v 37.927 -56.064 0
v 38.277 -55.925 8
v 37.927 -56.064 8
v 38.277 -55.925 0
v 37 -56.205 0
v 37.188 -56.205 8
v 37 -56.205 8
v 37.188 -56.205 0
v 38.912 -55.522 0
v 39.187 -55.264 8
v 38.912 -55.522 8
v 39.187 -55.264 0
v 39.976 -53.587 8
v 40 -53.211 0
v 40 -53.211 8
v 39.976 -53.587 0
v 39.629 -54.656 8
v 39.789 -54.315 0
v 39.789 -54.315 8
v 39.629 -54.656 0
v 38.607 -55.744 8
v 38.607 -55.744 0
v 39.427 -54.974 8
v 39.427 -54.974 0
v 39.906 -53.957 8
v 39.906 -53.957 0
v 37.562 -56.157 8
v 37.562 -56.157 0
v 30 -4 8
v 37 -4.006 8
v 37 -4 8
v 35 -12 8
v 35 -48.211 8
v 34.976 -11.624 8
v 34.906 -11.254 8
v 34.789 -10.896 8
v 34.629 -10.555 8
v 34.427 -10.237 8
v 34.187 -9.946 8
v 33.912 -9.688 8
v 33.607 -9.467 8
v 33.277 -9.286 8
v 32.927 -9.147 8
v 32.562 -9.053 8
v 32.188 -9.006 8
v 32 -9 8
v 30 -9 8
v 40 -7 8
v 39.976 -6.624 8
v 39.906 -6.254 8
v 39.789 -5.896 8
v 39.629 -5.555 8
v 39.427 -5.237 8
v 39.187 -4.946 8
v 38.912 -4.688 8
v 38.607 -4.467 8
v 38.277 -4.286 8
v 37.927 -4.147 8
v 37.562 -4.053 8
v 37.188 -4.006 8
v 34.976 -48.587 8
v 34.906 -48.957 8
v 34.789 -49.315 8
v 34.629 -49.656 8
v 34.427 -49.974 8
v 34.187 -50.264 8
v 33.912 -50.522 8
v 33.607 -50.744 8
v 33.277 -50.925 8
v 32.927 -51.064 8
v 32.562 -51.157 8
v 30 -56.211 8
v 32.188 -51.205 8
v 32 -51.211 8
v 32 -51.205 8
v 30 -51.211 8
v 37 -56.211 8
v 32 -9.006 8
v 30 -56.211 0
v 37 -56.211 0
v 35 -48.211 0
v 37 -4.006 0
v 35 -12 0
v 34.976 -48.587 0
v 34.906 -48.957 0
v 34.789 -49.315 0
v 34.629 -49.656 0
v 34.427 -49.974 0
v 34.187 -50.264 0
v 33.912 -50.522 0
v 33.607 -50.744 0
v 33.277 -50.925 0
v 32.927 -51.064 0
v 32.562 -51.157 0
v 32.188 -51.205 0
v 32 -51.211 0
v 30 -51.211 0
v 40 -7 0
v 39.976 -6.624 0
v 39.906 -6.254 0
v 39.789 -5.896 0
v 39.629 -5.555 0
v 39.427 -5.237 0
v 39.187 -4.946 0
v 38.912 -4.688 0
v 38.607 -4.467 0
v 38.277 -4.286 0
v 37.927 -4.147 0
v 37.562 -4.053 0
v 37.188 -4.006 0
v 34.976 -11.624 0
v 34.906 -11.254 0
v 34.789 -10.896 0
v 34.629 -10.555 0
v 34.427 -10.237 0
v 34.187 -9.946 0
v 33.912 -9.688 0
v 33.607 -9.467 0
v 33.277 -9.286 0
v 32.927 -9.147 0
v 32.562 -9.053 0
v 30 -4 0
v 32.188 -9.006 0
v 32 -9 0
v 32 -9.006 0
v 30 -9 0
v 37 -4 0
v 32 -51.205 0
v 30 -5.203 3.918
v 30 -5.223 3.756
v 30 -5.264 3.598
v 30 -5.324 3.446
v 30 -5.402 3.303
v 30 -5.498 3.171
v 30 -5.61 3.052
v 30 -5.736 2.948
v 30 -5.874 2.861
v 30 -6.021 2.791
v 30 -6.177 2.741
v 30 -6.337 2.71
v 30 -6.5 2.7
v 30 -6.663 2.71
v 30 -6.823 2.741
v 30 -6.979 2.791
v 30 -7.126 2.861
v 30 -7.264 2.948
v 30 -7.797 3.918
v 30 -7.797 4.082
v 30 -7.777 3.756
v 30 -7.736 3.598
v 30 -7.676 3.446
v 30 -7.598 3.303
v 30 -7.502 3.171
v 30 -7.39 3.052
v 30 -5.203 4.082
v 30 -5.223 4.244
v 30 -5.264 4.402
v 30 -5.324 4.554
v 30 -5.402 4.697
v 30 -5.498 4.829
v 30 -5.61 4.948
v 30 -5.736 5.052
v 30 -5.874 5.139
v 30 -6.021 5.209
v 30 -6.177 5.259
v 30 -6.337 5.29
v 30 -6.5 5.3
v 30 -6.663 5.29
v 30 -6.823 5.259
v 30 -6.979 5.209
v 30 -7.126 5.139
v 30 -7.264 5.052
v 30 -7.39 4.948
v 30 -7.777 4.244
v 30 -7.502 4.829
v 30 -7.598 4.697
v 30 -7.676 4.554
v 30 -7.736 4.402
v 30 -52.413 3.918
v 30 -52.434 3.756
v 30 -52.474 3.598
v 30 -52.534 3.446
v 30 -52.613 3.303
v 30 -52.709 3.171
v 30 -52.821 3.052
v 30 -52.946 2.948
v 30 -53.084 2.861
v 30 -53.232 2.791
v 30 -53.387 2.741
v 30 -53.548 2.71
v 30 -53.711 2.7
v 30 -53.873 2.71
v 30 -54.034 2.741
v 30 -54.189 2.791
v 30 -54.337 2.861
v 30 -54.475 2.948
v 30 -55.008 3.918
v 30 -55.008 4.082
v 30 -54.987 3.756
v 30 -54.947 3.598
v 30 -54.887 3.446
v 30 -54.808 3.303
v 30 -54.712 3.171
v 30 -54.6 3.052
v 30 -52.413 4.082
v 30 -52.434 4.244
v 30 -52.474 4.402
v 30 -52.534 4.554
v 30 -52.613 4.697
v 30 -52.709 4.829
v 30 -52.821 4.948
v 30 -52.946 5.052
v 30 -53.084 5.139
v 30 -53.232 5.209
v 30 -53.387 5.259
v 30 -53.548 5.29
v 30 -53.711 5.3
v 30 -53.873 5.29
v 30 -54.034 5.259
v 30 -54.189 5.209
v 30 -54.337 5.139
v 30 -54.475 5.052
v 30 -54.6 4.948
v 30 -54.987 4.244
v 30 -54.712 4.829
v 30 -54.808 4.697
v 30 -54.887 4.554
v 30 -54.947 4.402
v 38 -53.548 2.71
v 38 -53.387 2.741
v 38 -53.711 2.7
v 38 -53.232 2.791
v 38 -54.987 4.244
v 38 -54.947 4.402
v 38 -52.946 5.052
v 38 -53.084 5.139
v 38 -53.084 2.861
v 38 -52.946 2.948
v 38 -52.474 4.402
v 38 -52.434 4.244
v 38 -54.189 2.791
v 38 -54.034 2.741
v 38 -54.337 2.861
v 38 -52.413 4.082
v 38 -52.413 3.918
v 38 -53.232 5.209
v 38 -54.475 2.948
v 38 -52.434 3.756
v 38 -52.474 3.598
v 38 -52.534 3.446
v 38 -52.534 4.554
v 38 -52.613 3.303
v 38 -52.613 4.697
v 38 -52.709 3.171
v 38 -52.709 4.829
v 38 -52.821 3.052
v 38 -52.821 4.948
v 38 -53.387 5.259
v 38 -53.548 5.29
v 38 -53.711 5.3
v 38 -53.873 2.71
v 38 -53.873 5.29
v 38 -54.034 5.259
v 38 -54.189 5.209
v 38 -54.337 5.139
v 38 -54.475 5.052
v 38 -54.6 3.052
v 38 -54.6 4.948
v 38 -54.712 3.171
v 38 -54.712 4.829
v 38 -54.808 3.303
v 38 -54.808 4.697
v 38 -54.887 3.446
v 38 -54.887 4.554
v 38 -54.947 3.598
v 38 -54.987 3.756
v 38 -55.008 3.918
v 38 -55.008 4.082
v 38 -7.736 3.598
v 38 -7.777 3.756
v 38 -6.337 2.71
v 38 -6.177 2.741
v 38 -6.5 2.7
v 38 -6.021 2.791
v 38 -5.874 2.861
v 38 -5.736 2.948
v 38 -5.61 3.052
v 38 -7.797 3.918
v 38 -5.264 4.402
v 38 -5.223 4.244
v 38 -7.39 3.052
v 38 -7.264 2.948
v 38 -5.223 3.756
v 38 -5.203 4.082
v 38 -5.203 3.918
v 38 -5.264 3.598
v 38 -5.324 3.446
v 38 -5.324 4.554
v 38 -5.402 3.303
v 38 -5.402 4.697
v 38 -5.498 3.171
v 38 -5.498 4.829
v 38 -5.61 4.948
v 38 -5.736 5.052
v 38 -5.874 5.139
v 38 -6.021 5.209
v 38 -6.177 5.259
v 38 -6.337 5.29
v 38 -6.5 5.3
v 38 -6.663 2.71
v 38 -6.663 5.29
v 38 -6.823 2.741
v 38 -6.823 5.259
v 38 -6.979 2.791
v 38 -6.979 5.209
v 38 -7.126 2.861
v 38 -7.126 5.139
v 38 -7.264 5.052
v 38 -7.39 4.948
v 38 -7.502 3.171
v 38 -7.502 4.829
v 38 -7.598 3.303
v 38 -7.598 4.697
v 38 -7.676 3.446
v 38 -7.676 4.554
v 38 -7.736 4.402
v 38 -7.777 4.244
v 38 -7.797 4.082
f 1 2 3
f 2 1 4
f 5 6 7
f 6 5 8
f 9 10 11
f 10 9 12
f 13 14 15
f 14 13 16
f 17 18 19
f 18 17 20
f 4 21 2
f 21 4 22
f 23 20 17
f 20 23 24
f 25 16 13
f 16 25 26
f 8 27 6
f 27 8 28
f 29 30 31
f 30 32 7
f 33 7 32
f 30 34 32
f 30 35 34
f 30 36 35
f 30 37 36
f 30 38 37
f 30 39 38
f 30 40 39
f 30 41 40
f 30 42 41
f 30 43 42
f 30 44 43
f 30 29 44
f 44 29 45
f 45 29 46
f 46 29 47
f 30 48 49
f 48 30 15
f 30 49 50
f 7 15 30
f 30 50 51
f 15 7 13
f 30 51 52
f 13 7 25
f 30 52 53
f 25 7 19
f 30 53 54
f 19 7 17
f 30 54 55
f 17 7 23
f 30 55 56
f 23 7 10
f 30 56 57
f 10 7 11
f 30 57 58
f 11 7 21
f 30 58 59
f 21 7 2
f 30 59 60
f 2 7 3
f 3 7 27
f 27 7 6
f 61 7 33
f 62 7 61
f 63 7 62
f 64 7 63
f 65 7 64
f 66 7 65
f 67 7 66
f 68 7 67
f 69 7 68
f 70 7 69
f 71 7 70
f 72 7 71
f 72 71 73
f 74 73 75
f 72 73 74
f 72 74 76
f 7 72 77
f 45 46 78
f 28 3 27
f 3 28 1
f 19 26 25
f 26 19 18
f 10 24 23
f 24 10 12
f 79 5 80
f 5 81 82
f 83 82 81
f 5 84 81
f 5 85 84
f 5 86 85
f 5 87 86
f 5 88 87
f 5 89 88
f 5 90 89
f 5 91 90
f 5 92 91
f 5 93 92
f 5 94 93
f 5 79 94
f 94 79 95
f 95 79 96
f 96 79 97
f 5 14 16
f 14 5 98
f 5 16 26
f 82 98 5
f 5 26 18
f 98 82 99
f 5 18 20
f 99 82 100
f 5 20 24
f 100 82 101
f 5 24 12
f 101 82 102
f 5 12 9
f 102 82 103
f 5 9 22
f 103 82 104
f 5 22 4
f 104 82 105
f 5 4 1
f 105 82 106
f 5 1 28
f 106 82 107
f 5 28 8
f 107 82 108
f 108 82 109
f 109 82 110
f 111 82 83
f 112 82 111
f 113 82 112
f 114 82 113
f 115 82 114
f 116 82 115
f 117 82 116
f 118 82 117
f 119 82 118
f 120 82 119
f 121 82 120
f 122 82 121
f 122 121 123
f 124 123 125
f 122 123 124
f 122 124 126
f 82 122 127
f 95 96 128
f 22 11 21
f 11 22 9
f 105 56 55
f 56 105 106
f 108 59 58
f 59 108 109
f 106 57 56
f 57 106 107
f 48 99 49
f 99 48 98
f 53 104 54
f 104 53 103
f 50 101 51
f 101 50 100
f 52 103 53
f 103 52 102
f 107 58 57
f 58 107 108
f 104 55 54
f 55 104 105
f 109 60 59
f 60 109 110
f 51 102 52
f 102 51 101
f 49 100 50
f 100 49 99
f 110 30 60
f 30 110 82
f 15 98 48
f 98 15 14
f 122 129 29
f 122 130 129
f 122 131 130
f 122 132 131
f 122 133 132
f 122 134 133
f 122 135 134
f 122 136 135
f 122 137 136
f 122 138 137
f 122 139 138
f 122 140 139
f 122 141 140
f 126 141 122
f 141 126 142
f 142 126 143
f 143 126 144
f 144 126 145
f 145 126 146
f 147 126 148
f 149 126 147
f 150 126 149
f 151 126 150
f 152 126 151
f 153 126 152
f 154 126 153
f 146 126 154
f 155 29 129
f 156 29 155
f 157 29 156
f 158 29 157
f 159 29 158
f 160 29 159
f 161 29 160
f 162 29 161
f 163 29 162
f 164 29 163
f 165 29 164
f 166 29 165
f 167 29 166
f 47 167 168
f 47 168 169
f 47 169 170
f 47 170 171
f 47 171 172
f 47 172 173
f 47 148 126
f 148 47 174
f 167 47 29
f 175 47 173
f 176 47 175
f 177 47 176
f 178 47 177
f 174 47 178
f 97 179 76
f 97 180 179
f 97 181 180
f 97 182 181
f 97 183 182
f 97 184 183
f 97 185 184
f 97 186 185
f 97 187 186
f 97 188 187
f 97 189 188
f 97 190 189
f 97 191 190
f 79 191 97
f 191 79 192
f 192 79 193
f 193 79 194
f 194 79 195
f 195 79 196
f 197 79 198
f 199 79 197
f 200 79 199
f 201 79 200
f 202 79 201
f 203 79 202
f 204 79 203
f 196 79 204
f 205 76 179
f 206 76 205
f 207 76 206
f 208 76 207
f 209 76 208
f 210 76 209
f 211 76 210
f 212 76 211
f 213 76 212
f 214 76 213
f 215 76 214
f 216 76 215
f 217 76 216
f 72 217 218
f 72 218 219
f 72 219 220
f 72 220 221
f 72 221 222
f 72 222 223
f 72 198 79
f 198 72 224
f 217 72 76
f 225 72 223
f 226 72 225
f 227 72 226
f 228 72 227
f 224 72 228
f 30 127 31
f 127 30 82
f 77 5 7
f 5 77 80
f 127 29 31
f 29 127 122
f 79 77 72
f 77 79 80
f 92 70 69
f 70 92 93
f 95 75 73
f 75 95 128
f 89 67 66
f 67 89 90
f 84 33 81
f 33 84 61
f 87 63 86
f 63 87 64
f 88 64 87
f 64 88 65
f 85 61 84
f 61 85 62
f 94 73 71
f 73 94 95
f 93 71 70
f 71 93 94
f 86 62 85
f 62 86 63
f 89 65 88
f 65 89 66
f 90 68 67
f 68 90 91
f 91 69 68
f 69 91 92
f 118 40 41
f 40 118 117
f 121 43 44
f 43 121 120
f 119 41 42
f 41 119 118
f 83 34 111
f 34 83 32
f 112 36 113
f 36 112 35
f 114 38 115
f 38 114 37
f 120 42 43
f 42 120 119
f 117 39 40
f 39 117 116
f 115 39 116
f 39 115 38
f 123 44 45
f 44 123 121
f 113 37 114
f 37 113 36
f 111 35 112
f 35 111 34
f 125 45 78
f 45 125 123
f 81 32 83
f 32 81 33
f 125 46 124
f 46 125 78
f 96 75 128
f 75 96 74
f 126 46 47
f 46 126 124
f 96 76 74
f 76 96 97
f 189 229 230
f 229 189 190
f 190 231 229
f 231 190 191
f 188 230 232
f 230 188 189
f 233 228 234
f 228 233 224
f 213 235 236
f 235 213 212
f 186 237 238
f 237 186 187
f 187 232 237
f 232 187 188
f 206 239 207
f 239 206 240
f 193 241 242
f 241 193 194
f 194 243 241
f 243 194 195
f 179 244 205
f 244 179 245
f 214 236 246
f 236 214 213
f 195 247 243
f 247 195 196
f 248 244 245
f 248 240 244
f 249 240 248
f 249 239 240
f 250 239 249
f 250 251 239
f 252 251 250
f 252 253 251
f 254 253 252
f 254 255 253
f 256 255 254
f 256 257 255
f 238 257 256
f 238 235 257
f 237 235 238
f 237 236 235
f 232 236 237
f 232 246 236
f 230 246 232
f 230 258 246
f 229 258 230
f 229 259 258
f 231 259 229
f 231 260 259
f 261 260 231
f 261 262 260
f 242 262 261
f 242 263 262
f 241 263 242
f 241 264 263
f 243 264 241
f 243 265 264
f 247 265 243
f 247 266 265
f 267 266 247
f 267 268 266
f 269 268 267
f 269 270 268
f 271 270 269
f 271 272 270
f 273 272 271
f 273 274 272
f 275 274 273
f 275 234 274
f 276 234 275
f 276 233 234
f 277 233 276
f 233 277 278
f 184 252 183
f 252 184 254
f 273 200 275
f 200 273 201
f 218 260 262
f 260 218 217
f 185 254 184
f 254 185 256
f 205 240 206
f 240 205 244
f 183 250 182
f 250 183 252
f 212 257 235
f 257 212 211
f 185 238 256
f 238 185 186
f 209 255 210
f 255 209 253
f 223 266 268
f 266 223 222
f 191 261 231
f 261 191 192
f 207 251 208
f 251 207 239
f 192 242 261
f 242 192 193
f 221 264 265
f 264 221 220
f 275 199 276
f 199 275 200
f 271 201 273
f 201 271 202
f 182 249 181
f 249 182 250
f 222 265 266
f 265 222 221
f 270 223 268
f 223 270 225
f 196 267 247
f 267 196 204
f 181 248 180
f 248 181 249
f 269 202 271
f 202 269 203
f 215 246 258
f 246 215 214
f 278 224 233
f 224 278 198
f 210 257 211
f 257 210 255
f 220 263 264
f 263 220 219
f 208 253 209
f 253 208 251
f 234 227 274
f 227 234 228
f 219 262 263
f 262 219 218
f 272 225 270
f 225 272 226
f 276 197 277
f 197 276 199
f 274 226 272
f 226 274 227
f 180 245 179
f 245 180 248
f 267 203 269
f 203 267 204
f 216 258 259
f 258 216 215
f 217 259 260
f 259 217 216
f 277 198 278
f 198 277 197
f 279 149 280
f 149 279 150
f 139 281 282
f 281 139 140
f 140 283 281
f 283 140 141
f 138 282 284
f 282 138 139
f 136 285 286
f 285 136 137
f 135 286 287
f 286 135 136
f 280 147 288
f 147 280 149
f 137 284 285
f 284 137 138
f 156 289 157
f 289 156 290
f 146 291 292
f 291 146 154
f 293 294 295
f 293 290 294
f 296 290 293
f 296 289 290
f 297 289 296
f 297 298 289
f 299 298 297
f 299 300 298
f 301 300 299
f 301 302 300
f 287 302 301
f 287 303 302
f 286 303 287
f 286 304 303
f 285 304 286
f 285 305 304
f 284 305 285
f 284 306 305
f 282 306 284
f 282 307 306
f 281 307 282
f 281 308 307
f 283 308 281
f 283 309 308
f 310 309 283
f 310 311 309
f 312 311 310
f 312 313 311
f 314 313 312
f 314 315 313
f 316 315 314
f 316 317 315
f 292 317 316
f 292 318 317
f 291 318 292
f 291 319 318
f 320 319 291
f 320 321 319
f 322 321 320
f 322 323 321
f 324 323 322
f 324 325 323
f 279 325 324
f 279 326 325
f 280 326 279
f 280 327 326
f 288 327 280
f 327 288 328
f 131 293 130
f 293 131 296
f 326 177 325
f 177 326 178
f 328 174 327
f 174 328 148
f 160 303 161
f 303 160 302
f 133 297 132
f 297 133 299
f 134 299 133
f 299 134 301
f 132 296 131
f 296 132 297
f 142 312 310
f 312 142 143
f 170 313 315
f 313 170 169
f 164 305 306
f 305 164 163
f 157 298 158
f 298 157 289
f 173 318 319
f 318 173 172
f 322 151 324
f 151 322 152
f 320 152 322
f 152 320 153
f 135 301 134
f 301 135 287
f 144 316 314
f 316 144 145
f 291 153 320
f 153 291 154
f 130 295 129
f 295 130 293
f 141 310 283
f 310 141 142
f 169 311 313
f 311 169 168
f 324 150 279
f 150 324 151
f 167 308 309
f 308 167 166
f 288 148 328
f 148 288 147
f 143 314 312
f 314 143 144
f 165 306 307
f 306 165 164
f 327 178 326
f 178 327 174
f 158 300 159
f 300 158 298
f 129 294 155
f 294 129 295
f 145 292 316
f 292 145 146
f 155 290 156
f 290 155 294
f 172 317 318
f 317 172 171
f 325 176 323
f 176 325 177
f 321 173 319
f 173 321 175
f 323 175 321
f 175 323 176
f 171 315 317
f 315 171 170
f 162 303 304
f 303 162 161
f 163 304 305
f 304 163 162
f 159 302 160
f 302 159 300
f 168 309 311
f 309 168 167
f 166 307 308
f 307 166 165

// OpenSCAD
//Which part to print
Part = "c"; // [a:Frame, b:Drawer, c:Handles]

//Height of drawer in units
u = 2;

//Depth of drawer
dp = 115;

//Slip between drawer and frame
slip=0.5;


go();
module go(){    
        if(Part=="a"){
            print_frame();
        }else if(Part=="b"){
            print_drawer();
        }else if(Part=="c"){
            print_handles();
        }
}
            



module print_frame(){
    difference(){
        frontplate(u,[],[],[],[],[]);       
        translate([30,0,0]){cube([width-20,u*unit,dp]);}       
    }    
    difference(){
        translate([28,0,gauge]){cube([width-20+4,u*unit,dp]);}
        translate([30,2,gauge-1]){cube([width-20,u*unit-4,dp+2]);}
        }
    translate([20,0,gauge]){cube([115,2,dp]);}
    translate([20,u*unit-2,gauge]){cube([115,2,dp]);}
}



module print_drawer(){
    half = (width+40)/2;
    hhhd = (4*unit-9)/2; //half handle hole distance for 4U handle
    intersection(){
        difference(){
            frontplate(u,[],[],[],[],[]);       
            translate([20,0,gauge]){cube([width,u*unit,gauge]);}//remove support            
                translate([half+hhhd,(u*unit)/2,gauge-0.25]){rotate([180,0,0]){screw();}}
                translate([half-hhhd,(u*unit)/2,gauge-0.25]){rotate([180,0,0]){screw();}}
        }
        translate([30+slip,0,0]){cube([width-20-slip*2,u*unit,dp]);}       
    } 
    
    difference(){
        translate([30+slip,2+slip,gauge]){cube([width-20-2*slip,u*unit-4-2*slip,dp]);}    
        translate([30+slip+2,2+slip+2,gauge-0.01]){cube([width-20-2*slip-4,u*unit-4-2*slip,dp-2]);}
    }
}
    
  
module print_handles(){      
   // handle(u,true);
    difference(){ //remove the extra handle, it prints a set.
        translate([30,0,0]){handle(4,true);}
        translate([42,-100,-1]){cube([20,100,10]);}
    }
}















































$fn = 50*1;

//Constants, do not change !
sixinch   = 155*1;       // cm = 6"  
width     = 155-20-20;   // 11.5cm between rails
unit      = (44.5/19)*6; // 1U
gauge     = 3*1;
gauge_box = 2*1;

//Cabinet screws in mm. They can be changed a little
screw_head        = 7.4; 
screw_head_height = 2.2;  
screw_dia         = 3;   
screw_hole        = 2.6; 
screw_length      = 15;
nut_4mm           = 8.1; 
slip              = 0.35;




module chimney() {    
for(i=[0:8:80]){
    echo(i);
    translate([20 + (width-80)/2  +i,-1,20]){
        minkowski(){
            cube([0.01,200,30]);    
            sphere(d=2,h=1);        
        }
    }
}
}



 
     
 module back_plate(u,dp,screw_top,screw_bottom,screw_side,square_hole,round_hole){
    
     difference(){
        union(){
            translate([20+gauge_box+slip,gauge_box+slip,gauge+dp-gauge_box]){
                cube([width-2*gauge_box-2*slip, u*unit-2*gauge_box-2*slip, gauge_box]);
            }
        }
     
     //Square holes
        for(i=[0:len(square_hole)-1]){
            x = square_hole[i][0];
            y = square_hole[i][1];
            w = square_hole[i][2];
            h = square_hole[i][3];            
            translate([x+20+gauge_box,y+gauge_box,dp-1]){cube([w,h,gauge+2]);}        
        } 
    
    //Round holes
    if(len(round_hole)>0){
        for(i=[0:len(round_hole)-1]){
            x = round_hole[i][0];
            y = round_hole[i][1];
            dia = round_hole[i][2];
            translate([20+gauge_box+x,gauge_box+y,dp-4]){  cylinder(d=dia,h=10); }
        }
    }
        
    
    //Screw holes
    if(len(screw_top)>0){
        for(i=[0:len(screw_top)-1]){
            p = screw_top[i];
            translate([p,unit*u-gauge_box-4,gauge+dp+0.1]){rotate([0,180,0]){screw();}}
            translate([sixinch-p,unit*u-gauge_box-4,gauge+dp+0.1]){rotate([0,180,0]){screw();}} 
        }
    }
    if(len(screw_bottom)>0){
        for(i=[0:len(screw_bottom)-1]){
            p = screw_bottom[i]; 
            translate([p,gauge_box+4     ,gauge+dp+0.1]){rotate([0,180,0]){screw();}}
            translate([sixinch-p,    gauge_box+4    ,gauge+dp+0.1]){rotate([0,180,0]){screw();}} 
        }
    }
    
    if(len(screw_side)>0){
        for(i=[0:len(screw_side)-1]){
            p = screw_side[i];  
            translate([sixinch-20-6,    unit*p    ,gauge+dp+0.1]){rotate([0,180,0]){screw();}} 
            translate([20+6,    unit*p    ,gauge+dp+0.1]){rotate([0,180,0]){screw();}}   
        }
    }
}
}

 
 


module peg(x,y,od,id,he){
    translate([x,y,0]){
        rotate([-90,0,0]){
            difference(){
                cylinder(r2=od/2,r1=od*1.5,h=he);
                translate([0,0,-0.5]){cylinder(r1=id/2,h=he+1);}
            }        
        }
    }
}



module screwtrap(){  
    difference(){
        translate([0,0,5]){
            intersection(){
                scale([1,1,0.7]){
                    sphere(r=8);     
                }   
                translate([0,-0.001,-10]){  cube([20,20,20]);}
            }
        }  
        translate([2,4,5]){
            rotate([90,90,90]){
               translate([0,0,-10]){ cylinder(r=screw_dia/2,h=20,$fn=50);}
            }
        }    
    }
}





module nuttrap(){
    difference(){
        linear_extrude(10){
            polygon(points=[[0,0],[8,0],[2,8],[0,8]]);
        }
        translate([2,4,5]){
            rotate([90,90,90]){
                cylinder(r=nut_4mm/2,h=20,$fn=6);
            }
        }
        translate([2,4,5]){
            rotate([90,90,90]){
               translate([0,0,-10]){ cylinder(r=screw_dia/2,h=20,$fn=50);}
            }
        }
    }
}








module cabinet (dp,u,screw_bottom_front,round_peg,screw_side_front){
    difference(){
        box(dp,u,screw_bottom_front,round_peg,screw_side_front);
                        
               translate([20,unit/2+3,sixinch-40]){ cylinder(d=gauge_box,h=41);}
               translate([20,unit/2+0,sixinch-40]){ cylinder(d=gauge_box,h=41);}
               translate([20,unit/2-3,sixinch-40]){ cylinder(d=gauge_box,h=41);}
            
               translate([20+width,unit/2+3,sixinch-40]){ cylinder(d=gauge_box,h=41);}
               translate([20+width,unit/2+0,sixinch-40]){ cylinder(d=gauge_box,h=41);}
               translate([20+width,unit/2-3,sixinch-40]){ cylinder(d=gauge_box,h=41);}
               
              
        }
       
    }





module box(dp,u,screw_bottom_front,round_peg,screw_side_front){
    difference(){
        translate([20,0,gauge]){
            difference(){
                cube([115,u*unit,dp]);
                translate([gauge_box,gauge_box,-1]){ cube([115-gauge_box*2,u*unit,dp+2]);}                        
            }            
        }
        //CHIMNEY
        chimney(); 
    }
    
    //Screw mounts on the bottom plate
    for(i=[0:len(screw_bottom_front)-1]){
        p = screw_bottom_front[i];
        translate([p+5,gauge_box,gauge]){rotate([0,-90,0]){screwtrap();}}
        translate([sixinch-p+5,gauge_box,gauge]){rotate([0,-90,0]){screwtrap();}}        
        translate([p-5,gauge_box,gauge+dp-gauge_box]){rotate([0,90,0]){screwtrap();}}
        translate([sixinch-p-5,gauge_box,gauge+dp-gauge_box]){rotate([0,90,0]){screwtrap();}}
   }
    
   //Screw mounts on the side of cabinet
   if(len(screw_side_front)>0){
        for(i=[0:len(screw_side_front)-1]){
            p = screw_side_front[i]*unit;
                translate([20+gauge_box,p-5,gauge]){rotate([0,-90,-90]){screwtrap();}}
                translate([sixinch-20-gauge_box,p+5,gauge]){rotate([0,-90,90]){screwtrap();}}    
                translate([20+gauge_box,p+5,gauge+dp-gauge_box]){rotate([0,90,-90]){screwtrap();}}
                translate([sixinch-20-gauge_box,p-5,gauge+dp-gauge_box]){rotate([0,90,90]){screwtrap();}}    
        }
    }
    
    //Screw mounts for lid. Two on each side, three if dp>90
    translate([20+gauge_box,unit*u-gauge_box,gauge+10]){           rotate([0,0,-90]){screwtrap();}}    
    translate([20+gauge_box,unit*u-gauge_box,gauge+dp-10-10]){       rotate([0,0,-90]){screwtrap();}}            
    translate([sixinch-20-gauge_box,unit*u-gauge_box,gauge+10+10]){  rotate([180,0,-90]){screwtrap();}}
    translate([sixinch-20-gauge_box,unit*u-gauge_box,gauge+dp-10-10+10]){  rotate([180,0,-90]){screwtrap();}}
    if(dp>90){
        translate([sixinch-20-gauge_box,unit*u-gauge_box,gauge+dp/2-5+10]){rotate([180,0,-90]){screwtrap();}}
        translate([20+gauge_box,unit*u-gauge_box,gauge+dp/2-5]){rotate([0,0,-90]){screwtrap();}}
    }
    
    //Vertical print support
    /*translate([20+gauge_box,0,gauge+10+2])       {cube([7,u*unit-gauge_box,0.5]);}
    translate([20+gauge_box,0,gauge+dp-10-10+2]) {cube([7,u*unit-gauge_box,0.5]);}    
    translate([sixinch-20-gauge_box-7,0,gauge+10+2])       {cube([7,u*unit-gauge_box,0.5]);}
    translate([sixinch-20-gauge_box-7,0,gauge+dp-10-10+2]) {cube([7,u*unit-gauge_box,0.5]);}
    if(dp>90){
       translate([20+gauge_box,0,gauge+dp/2-3])       {cube([7,u*unit-gauge_box,0.5]);}
       translate([sixinch-20-gauge_box-7,0,gauge+dp/2-3])       {cube([7,u*unit-gauge_box,0.5]);}
    }*/
    
    
    
    module sup(){
        translate([0,-u*unit+gauge_box,2]){
            cube([7,u*unit-gauge_box,0.5]);
        }
    } 
    
    //Lid rest bar 
    translate([20+gauge_box,unit*u-3-gauge_box,gauge]){
        linear_extrude(dp-gauge_box){polygon (points=[[0,0],[3,3],[0,3]]);}
    }
    translate([sixinch-20-gauge_box,unit*u-3-gauge_box,gauge]){
        linear_extrude(dp-gauge_box){polygon (points=[[0,0],[-3,3],[0,3]]);}
    }
        
    // Back/front rest bar
    
    translate([20,gauge_box,dp+gauge-3-gauge_box]){
        rotate([0,90,0]){
            linear_extrude(width){polygon (points=[[-3,0],[-3,3],[0,0]]);}
        }
    }
    
    translate([20+width-gauge_box,0,dp+gauge-3-gauge_box]){
        rotate([0,90,90]){
            linear_extrude(unit*u-gauge_box){polygon (points=[[-3,0],[-3,3],[0,0]]);}
        }
    }
    
    translate([ 20+gauge_box ,0,dp+gauge-3-gauge_box]){
        rotate([0,90,90]){
            linear_extrude(unit*u-gauge_box){polygon (points=[[-3,0],[-3,-3],[0,0]]);}
        }
    }
    
    
/*    translate([0,0,dp+gauge-2-gauge_box]){
        difference(){
            translate([20,0,0]){  cube([width,unit*u-gauge_box,2]);  }
            translate([20+gauge_box+2,gauge_box+2,-1]){  cube([width-2*gauge_box-4,unit*u,4]);  }        
        }
    }*/
              
    //PEGS Relative to inside corner
    translate([20+gauge_box,0,gauge]){ 
        if(len(round_peg)>0){
            for(i=[0:len(round_peg)-1]){
                x = round_peg[i][0];
                y = round_peg[i][1];
                od = round_peg[i][2];
                id = round_peg[i][3];  
                he = round_peg[i][4];      
                translate([x,0,y]){peg(0,0,od,id,he); }
             }        
        }
    }    
}


module lid(dp,u,screw_front,screw_back){    

    difference(){
    union(){ 
        if(len(screw_front)>0){
            for(i=[0:len(screw_front)-1]){                                
                p = screw_front[i];                
                translate([p-5,unit*u-gauge_box,gauge]){rotate([0,-90,180]){screwtrap();}}
                translate([sixinch-p-5,unit*u-gauge_box,gauge]){rotate([0,-90,180]){screwtrap();}}
            }
        }        
        if(len(screw_back)>0){
            for(i=[0:len(screw_back)-1]){                                
                p = screw_back[i];                                
                translate([p+5,unit*u-gauge_box,gauge+dp-gauge_box]){rotate([0,90,180]){screwtrap();}}
                translate([sixinch-p+5,unit*u-gauge_box,gauge+dp-gauge_box]){rotate([0,90,180]){screwtrap();}} 
            }
        }

        //lid
        translate([20+gauge_box+slip,u*unit-gauge_box,gauge]){
            cube([115-gauge_box*2-slip*2,gauge_box,dp]);
        }    
        //back rest
        translate([sixinch/2-40,u*unit-gauge_box-2,gauge+dp-2-gauge_box]){
            cube([80,2,2]);
        }
    }        

    //Negative
    translate([20+gauge_box+4,unit*u+0.01  ,gauge+10+5]){rotate([90,0,0]){screw();}}
    translate([20+gauge_box+4,unit*u+0.01  ,gauge+dp-10-10+5]){rotate([90,0,0]){screw();}}    
    translate([sixinch-20-gauge_box-4,unit*u+0.01   ,gauge+10+10-5]){rotate([90,0,0]){screw();}}
    translate([sixinch-20-gauge_box-4,unit*u +0.01  ,gauge+dp-10-10+10-5]){rotate([90,0,0]){screw();}}
    if(dp>90){
        translate([sixinch-20-gauge_box-4,unit*u+0.01   ,gauge+dp/2-5+10-5]){rotate([90,0,0]){screw();}}    
        translate([20+gauge_box+4,unit*u+0.01   ,gauge+dp/2-5+5]){rotate([90,0,0]){screw();}}
    }
     chimney();

    
}        
}




module screw(){
    cylinder(r1=screw_head/2, r2=screw_dia/2, h=screw_head_height);
    cylinder(r=screw_dia/2, h=40);    
    translate([0,0,-0.99]){cylinder(r=screw_head/2, h=1);}    
}


module frontholes(u,screw_top,screw_bottom_front,screw_side_front){
    if(len(screw_bottom_front)>0){ 
    for(i=[0:len(screw_bottom_front)-1]){
        p = screw_bottom_front[i];
        translate([p,gauge_box+4,-0.01]){screw();}
        translate([sixinch-p,gauge_box+4,-0.01]){screw();}
    } 
    }    
    if(len(screw_side_front)>0){   
        for(i=[0:len(screw_side_front)-1]){
            p = screw_side_front[i]*unit;
            translate([20+gauge_box+4,p,-0.01]){screw();}
            translate([sixinch-20-gauge_box-4,p,-0.01]){screw();}    
        } 
    }   
    if(len(screw_top)>0){   
    for(i=[0:len(screw_top)-1]){
        p = screw_top[i];
        translate([p,unit*u-gauge_box-4,-0.01]){screw();}
        translate([sixinch-p,unit*u-gauge_box-4,-0.01]){screw();}    
    }
    }
}  
    




module handle(u,print){
    
    if(print){
        translate([16,-u*unit,8]){rotate([0,90,0]){handle1(u);}}
        translate([0,-u*unit,8]){rotate([0,90,0]){handle1(u);}}
    }else{
        translate([22,2,0]){rotate([0,180,0]){handle1(u);}}
        translate([sixinch-14,2,0]){rotate([0,180,0]){handle1(u);}}        
    }        
}

module handle1(u){
    difference(){
        handle2(8,u*unit-4,10,3);
        translate([-1,5,-1]){handle2(10,u*unit-10-4,6,3);}
    
        translate([4,2.5,-1]){          cylinder(r=screw_hole/2,h=9);}
        translate([4,u*unit-4-2.5,-1]){ cylinder(r=screw_hole/2,h=9);}
    }
}


module handle2(w,h,d,ra){          
    translate([0,ra,d-ra]){
        rotate([0,90,0]){
            cylinder(r=ra,h=w);
        }
    }
    translate([0,h-ra,d-ra]){
        rotate([0,90,0]){
            cylinder(r=ra,h=w);
        }
    }        
    translate([0,ra,0]){
        cube([w,h-ra-ra,d]);
    }
    cube([w,h,d-ra]);    
}





module insideprofile(l){
    difference(){
        union(){
            translate([7.6,10,0]){cube([4.8,10,l]);}
            translate([0,7.6,0]){cube([20,4.8,l]);}  
            
            translate([6.5,10-2.1,0]){cube([7   ,10,l]);}
            translate([2.1,6.5,0]){cube([15.8,7   ,l]);}  
        }
        translate([4,4,-1]){
            cube([12,12,l+2]);
        }
    } 
    translate([20,20,0]){
        rotate([0,-90,0]){
            linear_extrude(20){
                polygon (points=[[0,0],[l,0],[0,l]]);
            }
        }
    }    
}



module rightbottomplate(t){
    difference(){
        bottomplate(t);
        translate([-1,-1,-1]){
            cube([(sixinch+20)/2+1,sixinch+20+2,t+2]);
        }
    }
}

module leftbottomplate(t){
    difference(){
        bottomplate(t);
        translate([(sixinch+20)/2,-1,-1]){
            cube([(sixinch+20)/2+1,sixinch+20+2,t+2]);
        }
       # translate([10,10,-1]){cylinder(r=2.5,h=base+2);}
        translate([10,sixinch+20-10,-1]){cylinder(r=2.5,h=base+2);}
    
        
        translate([(sixinch+20)/2-20,-1,2.1]){cube([40,sixinch+20+2,2]);}
        
        }
    
    translate([0,0,base]){insideprofile(10);}
    rotate([0,0,180]){translate([-20,-sixinch-20,base]){insideprofile(10);}}   
}


module bottomplate(t){
translate([1,1,0]){
    minkowski(){
        cube([sixinch+20-2,sixinch+20-2,t-1]);
        cylinder(r=1,h=1);
    }
}
}




module frontplate(u,square_hole,round_hole,round_peg,screw_side_front,screw_top,screw_bottom_front){

    difference(){
        baseplate(u);
        
                   
        
        //Square holes
        if(len(square_hole)>0){
        for(i=[0:len(square_hole)-1]){
            x = square_hole[i][0];
            y = square_hole[i][1];
            w = square_hole[i][2];
            h = square_hole[i][3];            
            translate([x,y,-1]){cube([w,h,gauge+2]);}        
        } 
        }
        
       //Round holes
        if(len(round_hole)>0){
        for(i=[0:len(round_hole)-1]){
            x = round_hole[i][0];
            y = round_hole[i][1];
            d = round_hole[i][2];                       
            translate([x,y,-1]){cylinder(r=d/2,gauge+1);}        
        }   
    }

        //Cabinet holes
        frontholes(u,screw_top,screw_bottom_front,screw_side_front);
        
        //Handle holes
        translate([18,4.5,gauge-0.25]){rotate([180,0,0]){screw();}}
        translate([18,u*unit-4.5,gauge-0.25]){rotate([180,0,0]){screw();}}        
        translate([sixinch-18,4.5,gauge-0.25]){rotate([180,0,0]){screw();}}
        translate([sixinch-18,u*unit-4.5,gauge-0.25]){rotate([180,0,0]){screw();}}
    } 

    //chassis support
    /*
    translate([20+gauge_box,gauge_box,gauge]){
        difference(){
            cube([115-gauge_box*2,u*unit-2*gauge_box,3]);
            translate([gauge_box,gauge_box,-1]){ cube([115-gauge_box*4,u*unit-gauge_box*4,5]);}
        }
    } */



     //Handle base
    /*
        translate([14,0,0]){
            cube([8,u*unit,gauge/2]);
        }
        translate([sixinch-22,0,0]){
            cube([8,u*unit,gauge/2]);
        }
    */

    //Support pegs
    if(len(round_peg)>0){
        for(i=[0:len(round_peg)-1]){
            x = round_peg[i][0];
            y = round_peg[i][1];
            od = round_peg[i][2];
            id = round_peg[i][3];  
            he = round_peg[i][4];  
            translate([x,y,gauge]){
                difference(){
                 #   cylinder(r=od/2,h=he);
                 #   cylinder(r=id/2,h=he+1);
                }        
            }
    
        }
    }
    
    //cabinet support bars
    translate([0,0,gauge]){
        translate([20+width*0.25,gauge_box,0]){  cube([width*0.5,1,1.5]);  }
        translate([20+width*0.25,unit*u-1-gauge_box,0]){  cube([width*0.5,1,1.5]);  }           
    }
    
    
    
    }








module baseplate(u,handle){
    difference(){
    union(){
        translate([1.25,1.25,1.25]){
            minkowski(){
                cube([sixinch-2.5,unit*u-2.5,gauge-2.5]);
                sphere(r=1.25);
            }
        }
    }
    //Rack mount holes
    translate([10-0.5,unit/2,-gauge/2])                 {cylinder(r=2.3,gauge*2);}
    translate([sixinch-10+0.5,unit/2,-gauge/2])         {cylinder(r=2.3,gauge*2);}
    translate([10-0.5,u*unit-(unit/2),-gauge/2])        {cylinder(r=2.3,gauge*2);}
    translate([sixinch-10+0.5,u*unit-(unit/2),-gauge/2]){cylinder(r=2.3,gauge*2);}
    if(u>=5){
        translate([10-0.5,(u*unit)/2,-gauge/2])         {cylinder(r=2.3,gauge*2);}
        translate([sixinch-10+0.5,(u*unit)/2,-gauge/2]) {cylinder(r=2.3,gauge*2);}
    }  
}    
}


module fan(sz,vent,hole,grid,head,d){
    difference(){
        intersection(){
            translate([sz/2,sz/2,0]){cylinder(d=vent,h=d);}    
            translate([-hole/2,-hole/2,0]){cube([sz+hole,sz+hole,d]);}
        }        
        for(i=[-grid*8:grid:grid*8]){        
            translate([sz/2+i,sz/2,5]){
                rotate([0,0,45]){
                    cube([2,100,12],center=true);        
                }
            }
            translate([sz/2+i,sz/2,5]){
                rotate([0,0,-45]){
                    cube([2,100,12],center=true);        
                }
            }
        }        
    }
    translate([0,0,0])  {cylinder(d=hole,h=d); cylinder(d1=head,d2=0,h=head/1.5);  }
    translate([sz,0,0]) {cylinder(d=hole,h=d); cylinder(d1=head,d2=0,h=head/1.5);  }
    translate([sz,sz,0]){cylinder(d=hole,h=d); cylinder(d1=head,d2=0,h=head/1.5);  }
    translate([0,sz,0]) {cylinder(d=hole,h=d); cylinder(d1=head,d2=0,h=head/1.5);  }        
}
